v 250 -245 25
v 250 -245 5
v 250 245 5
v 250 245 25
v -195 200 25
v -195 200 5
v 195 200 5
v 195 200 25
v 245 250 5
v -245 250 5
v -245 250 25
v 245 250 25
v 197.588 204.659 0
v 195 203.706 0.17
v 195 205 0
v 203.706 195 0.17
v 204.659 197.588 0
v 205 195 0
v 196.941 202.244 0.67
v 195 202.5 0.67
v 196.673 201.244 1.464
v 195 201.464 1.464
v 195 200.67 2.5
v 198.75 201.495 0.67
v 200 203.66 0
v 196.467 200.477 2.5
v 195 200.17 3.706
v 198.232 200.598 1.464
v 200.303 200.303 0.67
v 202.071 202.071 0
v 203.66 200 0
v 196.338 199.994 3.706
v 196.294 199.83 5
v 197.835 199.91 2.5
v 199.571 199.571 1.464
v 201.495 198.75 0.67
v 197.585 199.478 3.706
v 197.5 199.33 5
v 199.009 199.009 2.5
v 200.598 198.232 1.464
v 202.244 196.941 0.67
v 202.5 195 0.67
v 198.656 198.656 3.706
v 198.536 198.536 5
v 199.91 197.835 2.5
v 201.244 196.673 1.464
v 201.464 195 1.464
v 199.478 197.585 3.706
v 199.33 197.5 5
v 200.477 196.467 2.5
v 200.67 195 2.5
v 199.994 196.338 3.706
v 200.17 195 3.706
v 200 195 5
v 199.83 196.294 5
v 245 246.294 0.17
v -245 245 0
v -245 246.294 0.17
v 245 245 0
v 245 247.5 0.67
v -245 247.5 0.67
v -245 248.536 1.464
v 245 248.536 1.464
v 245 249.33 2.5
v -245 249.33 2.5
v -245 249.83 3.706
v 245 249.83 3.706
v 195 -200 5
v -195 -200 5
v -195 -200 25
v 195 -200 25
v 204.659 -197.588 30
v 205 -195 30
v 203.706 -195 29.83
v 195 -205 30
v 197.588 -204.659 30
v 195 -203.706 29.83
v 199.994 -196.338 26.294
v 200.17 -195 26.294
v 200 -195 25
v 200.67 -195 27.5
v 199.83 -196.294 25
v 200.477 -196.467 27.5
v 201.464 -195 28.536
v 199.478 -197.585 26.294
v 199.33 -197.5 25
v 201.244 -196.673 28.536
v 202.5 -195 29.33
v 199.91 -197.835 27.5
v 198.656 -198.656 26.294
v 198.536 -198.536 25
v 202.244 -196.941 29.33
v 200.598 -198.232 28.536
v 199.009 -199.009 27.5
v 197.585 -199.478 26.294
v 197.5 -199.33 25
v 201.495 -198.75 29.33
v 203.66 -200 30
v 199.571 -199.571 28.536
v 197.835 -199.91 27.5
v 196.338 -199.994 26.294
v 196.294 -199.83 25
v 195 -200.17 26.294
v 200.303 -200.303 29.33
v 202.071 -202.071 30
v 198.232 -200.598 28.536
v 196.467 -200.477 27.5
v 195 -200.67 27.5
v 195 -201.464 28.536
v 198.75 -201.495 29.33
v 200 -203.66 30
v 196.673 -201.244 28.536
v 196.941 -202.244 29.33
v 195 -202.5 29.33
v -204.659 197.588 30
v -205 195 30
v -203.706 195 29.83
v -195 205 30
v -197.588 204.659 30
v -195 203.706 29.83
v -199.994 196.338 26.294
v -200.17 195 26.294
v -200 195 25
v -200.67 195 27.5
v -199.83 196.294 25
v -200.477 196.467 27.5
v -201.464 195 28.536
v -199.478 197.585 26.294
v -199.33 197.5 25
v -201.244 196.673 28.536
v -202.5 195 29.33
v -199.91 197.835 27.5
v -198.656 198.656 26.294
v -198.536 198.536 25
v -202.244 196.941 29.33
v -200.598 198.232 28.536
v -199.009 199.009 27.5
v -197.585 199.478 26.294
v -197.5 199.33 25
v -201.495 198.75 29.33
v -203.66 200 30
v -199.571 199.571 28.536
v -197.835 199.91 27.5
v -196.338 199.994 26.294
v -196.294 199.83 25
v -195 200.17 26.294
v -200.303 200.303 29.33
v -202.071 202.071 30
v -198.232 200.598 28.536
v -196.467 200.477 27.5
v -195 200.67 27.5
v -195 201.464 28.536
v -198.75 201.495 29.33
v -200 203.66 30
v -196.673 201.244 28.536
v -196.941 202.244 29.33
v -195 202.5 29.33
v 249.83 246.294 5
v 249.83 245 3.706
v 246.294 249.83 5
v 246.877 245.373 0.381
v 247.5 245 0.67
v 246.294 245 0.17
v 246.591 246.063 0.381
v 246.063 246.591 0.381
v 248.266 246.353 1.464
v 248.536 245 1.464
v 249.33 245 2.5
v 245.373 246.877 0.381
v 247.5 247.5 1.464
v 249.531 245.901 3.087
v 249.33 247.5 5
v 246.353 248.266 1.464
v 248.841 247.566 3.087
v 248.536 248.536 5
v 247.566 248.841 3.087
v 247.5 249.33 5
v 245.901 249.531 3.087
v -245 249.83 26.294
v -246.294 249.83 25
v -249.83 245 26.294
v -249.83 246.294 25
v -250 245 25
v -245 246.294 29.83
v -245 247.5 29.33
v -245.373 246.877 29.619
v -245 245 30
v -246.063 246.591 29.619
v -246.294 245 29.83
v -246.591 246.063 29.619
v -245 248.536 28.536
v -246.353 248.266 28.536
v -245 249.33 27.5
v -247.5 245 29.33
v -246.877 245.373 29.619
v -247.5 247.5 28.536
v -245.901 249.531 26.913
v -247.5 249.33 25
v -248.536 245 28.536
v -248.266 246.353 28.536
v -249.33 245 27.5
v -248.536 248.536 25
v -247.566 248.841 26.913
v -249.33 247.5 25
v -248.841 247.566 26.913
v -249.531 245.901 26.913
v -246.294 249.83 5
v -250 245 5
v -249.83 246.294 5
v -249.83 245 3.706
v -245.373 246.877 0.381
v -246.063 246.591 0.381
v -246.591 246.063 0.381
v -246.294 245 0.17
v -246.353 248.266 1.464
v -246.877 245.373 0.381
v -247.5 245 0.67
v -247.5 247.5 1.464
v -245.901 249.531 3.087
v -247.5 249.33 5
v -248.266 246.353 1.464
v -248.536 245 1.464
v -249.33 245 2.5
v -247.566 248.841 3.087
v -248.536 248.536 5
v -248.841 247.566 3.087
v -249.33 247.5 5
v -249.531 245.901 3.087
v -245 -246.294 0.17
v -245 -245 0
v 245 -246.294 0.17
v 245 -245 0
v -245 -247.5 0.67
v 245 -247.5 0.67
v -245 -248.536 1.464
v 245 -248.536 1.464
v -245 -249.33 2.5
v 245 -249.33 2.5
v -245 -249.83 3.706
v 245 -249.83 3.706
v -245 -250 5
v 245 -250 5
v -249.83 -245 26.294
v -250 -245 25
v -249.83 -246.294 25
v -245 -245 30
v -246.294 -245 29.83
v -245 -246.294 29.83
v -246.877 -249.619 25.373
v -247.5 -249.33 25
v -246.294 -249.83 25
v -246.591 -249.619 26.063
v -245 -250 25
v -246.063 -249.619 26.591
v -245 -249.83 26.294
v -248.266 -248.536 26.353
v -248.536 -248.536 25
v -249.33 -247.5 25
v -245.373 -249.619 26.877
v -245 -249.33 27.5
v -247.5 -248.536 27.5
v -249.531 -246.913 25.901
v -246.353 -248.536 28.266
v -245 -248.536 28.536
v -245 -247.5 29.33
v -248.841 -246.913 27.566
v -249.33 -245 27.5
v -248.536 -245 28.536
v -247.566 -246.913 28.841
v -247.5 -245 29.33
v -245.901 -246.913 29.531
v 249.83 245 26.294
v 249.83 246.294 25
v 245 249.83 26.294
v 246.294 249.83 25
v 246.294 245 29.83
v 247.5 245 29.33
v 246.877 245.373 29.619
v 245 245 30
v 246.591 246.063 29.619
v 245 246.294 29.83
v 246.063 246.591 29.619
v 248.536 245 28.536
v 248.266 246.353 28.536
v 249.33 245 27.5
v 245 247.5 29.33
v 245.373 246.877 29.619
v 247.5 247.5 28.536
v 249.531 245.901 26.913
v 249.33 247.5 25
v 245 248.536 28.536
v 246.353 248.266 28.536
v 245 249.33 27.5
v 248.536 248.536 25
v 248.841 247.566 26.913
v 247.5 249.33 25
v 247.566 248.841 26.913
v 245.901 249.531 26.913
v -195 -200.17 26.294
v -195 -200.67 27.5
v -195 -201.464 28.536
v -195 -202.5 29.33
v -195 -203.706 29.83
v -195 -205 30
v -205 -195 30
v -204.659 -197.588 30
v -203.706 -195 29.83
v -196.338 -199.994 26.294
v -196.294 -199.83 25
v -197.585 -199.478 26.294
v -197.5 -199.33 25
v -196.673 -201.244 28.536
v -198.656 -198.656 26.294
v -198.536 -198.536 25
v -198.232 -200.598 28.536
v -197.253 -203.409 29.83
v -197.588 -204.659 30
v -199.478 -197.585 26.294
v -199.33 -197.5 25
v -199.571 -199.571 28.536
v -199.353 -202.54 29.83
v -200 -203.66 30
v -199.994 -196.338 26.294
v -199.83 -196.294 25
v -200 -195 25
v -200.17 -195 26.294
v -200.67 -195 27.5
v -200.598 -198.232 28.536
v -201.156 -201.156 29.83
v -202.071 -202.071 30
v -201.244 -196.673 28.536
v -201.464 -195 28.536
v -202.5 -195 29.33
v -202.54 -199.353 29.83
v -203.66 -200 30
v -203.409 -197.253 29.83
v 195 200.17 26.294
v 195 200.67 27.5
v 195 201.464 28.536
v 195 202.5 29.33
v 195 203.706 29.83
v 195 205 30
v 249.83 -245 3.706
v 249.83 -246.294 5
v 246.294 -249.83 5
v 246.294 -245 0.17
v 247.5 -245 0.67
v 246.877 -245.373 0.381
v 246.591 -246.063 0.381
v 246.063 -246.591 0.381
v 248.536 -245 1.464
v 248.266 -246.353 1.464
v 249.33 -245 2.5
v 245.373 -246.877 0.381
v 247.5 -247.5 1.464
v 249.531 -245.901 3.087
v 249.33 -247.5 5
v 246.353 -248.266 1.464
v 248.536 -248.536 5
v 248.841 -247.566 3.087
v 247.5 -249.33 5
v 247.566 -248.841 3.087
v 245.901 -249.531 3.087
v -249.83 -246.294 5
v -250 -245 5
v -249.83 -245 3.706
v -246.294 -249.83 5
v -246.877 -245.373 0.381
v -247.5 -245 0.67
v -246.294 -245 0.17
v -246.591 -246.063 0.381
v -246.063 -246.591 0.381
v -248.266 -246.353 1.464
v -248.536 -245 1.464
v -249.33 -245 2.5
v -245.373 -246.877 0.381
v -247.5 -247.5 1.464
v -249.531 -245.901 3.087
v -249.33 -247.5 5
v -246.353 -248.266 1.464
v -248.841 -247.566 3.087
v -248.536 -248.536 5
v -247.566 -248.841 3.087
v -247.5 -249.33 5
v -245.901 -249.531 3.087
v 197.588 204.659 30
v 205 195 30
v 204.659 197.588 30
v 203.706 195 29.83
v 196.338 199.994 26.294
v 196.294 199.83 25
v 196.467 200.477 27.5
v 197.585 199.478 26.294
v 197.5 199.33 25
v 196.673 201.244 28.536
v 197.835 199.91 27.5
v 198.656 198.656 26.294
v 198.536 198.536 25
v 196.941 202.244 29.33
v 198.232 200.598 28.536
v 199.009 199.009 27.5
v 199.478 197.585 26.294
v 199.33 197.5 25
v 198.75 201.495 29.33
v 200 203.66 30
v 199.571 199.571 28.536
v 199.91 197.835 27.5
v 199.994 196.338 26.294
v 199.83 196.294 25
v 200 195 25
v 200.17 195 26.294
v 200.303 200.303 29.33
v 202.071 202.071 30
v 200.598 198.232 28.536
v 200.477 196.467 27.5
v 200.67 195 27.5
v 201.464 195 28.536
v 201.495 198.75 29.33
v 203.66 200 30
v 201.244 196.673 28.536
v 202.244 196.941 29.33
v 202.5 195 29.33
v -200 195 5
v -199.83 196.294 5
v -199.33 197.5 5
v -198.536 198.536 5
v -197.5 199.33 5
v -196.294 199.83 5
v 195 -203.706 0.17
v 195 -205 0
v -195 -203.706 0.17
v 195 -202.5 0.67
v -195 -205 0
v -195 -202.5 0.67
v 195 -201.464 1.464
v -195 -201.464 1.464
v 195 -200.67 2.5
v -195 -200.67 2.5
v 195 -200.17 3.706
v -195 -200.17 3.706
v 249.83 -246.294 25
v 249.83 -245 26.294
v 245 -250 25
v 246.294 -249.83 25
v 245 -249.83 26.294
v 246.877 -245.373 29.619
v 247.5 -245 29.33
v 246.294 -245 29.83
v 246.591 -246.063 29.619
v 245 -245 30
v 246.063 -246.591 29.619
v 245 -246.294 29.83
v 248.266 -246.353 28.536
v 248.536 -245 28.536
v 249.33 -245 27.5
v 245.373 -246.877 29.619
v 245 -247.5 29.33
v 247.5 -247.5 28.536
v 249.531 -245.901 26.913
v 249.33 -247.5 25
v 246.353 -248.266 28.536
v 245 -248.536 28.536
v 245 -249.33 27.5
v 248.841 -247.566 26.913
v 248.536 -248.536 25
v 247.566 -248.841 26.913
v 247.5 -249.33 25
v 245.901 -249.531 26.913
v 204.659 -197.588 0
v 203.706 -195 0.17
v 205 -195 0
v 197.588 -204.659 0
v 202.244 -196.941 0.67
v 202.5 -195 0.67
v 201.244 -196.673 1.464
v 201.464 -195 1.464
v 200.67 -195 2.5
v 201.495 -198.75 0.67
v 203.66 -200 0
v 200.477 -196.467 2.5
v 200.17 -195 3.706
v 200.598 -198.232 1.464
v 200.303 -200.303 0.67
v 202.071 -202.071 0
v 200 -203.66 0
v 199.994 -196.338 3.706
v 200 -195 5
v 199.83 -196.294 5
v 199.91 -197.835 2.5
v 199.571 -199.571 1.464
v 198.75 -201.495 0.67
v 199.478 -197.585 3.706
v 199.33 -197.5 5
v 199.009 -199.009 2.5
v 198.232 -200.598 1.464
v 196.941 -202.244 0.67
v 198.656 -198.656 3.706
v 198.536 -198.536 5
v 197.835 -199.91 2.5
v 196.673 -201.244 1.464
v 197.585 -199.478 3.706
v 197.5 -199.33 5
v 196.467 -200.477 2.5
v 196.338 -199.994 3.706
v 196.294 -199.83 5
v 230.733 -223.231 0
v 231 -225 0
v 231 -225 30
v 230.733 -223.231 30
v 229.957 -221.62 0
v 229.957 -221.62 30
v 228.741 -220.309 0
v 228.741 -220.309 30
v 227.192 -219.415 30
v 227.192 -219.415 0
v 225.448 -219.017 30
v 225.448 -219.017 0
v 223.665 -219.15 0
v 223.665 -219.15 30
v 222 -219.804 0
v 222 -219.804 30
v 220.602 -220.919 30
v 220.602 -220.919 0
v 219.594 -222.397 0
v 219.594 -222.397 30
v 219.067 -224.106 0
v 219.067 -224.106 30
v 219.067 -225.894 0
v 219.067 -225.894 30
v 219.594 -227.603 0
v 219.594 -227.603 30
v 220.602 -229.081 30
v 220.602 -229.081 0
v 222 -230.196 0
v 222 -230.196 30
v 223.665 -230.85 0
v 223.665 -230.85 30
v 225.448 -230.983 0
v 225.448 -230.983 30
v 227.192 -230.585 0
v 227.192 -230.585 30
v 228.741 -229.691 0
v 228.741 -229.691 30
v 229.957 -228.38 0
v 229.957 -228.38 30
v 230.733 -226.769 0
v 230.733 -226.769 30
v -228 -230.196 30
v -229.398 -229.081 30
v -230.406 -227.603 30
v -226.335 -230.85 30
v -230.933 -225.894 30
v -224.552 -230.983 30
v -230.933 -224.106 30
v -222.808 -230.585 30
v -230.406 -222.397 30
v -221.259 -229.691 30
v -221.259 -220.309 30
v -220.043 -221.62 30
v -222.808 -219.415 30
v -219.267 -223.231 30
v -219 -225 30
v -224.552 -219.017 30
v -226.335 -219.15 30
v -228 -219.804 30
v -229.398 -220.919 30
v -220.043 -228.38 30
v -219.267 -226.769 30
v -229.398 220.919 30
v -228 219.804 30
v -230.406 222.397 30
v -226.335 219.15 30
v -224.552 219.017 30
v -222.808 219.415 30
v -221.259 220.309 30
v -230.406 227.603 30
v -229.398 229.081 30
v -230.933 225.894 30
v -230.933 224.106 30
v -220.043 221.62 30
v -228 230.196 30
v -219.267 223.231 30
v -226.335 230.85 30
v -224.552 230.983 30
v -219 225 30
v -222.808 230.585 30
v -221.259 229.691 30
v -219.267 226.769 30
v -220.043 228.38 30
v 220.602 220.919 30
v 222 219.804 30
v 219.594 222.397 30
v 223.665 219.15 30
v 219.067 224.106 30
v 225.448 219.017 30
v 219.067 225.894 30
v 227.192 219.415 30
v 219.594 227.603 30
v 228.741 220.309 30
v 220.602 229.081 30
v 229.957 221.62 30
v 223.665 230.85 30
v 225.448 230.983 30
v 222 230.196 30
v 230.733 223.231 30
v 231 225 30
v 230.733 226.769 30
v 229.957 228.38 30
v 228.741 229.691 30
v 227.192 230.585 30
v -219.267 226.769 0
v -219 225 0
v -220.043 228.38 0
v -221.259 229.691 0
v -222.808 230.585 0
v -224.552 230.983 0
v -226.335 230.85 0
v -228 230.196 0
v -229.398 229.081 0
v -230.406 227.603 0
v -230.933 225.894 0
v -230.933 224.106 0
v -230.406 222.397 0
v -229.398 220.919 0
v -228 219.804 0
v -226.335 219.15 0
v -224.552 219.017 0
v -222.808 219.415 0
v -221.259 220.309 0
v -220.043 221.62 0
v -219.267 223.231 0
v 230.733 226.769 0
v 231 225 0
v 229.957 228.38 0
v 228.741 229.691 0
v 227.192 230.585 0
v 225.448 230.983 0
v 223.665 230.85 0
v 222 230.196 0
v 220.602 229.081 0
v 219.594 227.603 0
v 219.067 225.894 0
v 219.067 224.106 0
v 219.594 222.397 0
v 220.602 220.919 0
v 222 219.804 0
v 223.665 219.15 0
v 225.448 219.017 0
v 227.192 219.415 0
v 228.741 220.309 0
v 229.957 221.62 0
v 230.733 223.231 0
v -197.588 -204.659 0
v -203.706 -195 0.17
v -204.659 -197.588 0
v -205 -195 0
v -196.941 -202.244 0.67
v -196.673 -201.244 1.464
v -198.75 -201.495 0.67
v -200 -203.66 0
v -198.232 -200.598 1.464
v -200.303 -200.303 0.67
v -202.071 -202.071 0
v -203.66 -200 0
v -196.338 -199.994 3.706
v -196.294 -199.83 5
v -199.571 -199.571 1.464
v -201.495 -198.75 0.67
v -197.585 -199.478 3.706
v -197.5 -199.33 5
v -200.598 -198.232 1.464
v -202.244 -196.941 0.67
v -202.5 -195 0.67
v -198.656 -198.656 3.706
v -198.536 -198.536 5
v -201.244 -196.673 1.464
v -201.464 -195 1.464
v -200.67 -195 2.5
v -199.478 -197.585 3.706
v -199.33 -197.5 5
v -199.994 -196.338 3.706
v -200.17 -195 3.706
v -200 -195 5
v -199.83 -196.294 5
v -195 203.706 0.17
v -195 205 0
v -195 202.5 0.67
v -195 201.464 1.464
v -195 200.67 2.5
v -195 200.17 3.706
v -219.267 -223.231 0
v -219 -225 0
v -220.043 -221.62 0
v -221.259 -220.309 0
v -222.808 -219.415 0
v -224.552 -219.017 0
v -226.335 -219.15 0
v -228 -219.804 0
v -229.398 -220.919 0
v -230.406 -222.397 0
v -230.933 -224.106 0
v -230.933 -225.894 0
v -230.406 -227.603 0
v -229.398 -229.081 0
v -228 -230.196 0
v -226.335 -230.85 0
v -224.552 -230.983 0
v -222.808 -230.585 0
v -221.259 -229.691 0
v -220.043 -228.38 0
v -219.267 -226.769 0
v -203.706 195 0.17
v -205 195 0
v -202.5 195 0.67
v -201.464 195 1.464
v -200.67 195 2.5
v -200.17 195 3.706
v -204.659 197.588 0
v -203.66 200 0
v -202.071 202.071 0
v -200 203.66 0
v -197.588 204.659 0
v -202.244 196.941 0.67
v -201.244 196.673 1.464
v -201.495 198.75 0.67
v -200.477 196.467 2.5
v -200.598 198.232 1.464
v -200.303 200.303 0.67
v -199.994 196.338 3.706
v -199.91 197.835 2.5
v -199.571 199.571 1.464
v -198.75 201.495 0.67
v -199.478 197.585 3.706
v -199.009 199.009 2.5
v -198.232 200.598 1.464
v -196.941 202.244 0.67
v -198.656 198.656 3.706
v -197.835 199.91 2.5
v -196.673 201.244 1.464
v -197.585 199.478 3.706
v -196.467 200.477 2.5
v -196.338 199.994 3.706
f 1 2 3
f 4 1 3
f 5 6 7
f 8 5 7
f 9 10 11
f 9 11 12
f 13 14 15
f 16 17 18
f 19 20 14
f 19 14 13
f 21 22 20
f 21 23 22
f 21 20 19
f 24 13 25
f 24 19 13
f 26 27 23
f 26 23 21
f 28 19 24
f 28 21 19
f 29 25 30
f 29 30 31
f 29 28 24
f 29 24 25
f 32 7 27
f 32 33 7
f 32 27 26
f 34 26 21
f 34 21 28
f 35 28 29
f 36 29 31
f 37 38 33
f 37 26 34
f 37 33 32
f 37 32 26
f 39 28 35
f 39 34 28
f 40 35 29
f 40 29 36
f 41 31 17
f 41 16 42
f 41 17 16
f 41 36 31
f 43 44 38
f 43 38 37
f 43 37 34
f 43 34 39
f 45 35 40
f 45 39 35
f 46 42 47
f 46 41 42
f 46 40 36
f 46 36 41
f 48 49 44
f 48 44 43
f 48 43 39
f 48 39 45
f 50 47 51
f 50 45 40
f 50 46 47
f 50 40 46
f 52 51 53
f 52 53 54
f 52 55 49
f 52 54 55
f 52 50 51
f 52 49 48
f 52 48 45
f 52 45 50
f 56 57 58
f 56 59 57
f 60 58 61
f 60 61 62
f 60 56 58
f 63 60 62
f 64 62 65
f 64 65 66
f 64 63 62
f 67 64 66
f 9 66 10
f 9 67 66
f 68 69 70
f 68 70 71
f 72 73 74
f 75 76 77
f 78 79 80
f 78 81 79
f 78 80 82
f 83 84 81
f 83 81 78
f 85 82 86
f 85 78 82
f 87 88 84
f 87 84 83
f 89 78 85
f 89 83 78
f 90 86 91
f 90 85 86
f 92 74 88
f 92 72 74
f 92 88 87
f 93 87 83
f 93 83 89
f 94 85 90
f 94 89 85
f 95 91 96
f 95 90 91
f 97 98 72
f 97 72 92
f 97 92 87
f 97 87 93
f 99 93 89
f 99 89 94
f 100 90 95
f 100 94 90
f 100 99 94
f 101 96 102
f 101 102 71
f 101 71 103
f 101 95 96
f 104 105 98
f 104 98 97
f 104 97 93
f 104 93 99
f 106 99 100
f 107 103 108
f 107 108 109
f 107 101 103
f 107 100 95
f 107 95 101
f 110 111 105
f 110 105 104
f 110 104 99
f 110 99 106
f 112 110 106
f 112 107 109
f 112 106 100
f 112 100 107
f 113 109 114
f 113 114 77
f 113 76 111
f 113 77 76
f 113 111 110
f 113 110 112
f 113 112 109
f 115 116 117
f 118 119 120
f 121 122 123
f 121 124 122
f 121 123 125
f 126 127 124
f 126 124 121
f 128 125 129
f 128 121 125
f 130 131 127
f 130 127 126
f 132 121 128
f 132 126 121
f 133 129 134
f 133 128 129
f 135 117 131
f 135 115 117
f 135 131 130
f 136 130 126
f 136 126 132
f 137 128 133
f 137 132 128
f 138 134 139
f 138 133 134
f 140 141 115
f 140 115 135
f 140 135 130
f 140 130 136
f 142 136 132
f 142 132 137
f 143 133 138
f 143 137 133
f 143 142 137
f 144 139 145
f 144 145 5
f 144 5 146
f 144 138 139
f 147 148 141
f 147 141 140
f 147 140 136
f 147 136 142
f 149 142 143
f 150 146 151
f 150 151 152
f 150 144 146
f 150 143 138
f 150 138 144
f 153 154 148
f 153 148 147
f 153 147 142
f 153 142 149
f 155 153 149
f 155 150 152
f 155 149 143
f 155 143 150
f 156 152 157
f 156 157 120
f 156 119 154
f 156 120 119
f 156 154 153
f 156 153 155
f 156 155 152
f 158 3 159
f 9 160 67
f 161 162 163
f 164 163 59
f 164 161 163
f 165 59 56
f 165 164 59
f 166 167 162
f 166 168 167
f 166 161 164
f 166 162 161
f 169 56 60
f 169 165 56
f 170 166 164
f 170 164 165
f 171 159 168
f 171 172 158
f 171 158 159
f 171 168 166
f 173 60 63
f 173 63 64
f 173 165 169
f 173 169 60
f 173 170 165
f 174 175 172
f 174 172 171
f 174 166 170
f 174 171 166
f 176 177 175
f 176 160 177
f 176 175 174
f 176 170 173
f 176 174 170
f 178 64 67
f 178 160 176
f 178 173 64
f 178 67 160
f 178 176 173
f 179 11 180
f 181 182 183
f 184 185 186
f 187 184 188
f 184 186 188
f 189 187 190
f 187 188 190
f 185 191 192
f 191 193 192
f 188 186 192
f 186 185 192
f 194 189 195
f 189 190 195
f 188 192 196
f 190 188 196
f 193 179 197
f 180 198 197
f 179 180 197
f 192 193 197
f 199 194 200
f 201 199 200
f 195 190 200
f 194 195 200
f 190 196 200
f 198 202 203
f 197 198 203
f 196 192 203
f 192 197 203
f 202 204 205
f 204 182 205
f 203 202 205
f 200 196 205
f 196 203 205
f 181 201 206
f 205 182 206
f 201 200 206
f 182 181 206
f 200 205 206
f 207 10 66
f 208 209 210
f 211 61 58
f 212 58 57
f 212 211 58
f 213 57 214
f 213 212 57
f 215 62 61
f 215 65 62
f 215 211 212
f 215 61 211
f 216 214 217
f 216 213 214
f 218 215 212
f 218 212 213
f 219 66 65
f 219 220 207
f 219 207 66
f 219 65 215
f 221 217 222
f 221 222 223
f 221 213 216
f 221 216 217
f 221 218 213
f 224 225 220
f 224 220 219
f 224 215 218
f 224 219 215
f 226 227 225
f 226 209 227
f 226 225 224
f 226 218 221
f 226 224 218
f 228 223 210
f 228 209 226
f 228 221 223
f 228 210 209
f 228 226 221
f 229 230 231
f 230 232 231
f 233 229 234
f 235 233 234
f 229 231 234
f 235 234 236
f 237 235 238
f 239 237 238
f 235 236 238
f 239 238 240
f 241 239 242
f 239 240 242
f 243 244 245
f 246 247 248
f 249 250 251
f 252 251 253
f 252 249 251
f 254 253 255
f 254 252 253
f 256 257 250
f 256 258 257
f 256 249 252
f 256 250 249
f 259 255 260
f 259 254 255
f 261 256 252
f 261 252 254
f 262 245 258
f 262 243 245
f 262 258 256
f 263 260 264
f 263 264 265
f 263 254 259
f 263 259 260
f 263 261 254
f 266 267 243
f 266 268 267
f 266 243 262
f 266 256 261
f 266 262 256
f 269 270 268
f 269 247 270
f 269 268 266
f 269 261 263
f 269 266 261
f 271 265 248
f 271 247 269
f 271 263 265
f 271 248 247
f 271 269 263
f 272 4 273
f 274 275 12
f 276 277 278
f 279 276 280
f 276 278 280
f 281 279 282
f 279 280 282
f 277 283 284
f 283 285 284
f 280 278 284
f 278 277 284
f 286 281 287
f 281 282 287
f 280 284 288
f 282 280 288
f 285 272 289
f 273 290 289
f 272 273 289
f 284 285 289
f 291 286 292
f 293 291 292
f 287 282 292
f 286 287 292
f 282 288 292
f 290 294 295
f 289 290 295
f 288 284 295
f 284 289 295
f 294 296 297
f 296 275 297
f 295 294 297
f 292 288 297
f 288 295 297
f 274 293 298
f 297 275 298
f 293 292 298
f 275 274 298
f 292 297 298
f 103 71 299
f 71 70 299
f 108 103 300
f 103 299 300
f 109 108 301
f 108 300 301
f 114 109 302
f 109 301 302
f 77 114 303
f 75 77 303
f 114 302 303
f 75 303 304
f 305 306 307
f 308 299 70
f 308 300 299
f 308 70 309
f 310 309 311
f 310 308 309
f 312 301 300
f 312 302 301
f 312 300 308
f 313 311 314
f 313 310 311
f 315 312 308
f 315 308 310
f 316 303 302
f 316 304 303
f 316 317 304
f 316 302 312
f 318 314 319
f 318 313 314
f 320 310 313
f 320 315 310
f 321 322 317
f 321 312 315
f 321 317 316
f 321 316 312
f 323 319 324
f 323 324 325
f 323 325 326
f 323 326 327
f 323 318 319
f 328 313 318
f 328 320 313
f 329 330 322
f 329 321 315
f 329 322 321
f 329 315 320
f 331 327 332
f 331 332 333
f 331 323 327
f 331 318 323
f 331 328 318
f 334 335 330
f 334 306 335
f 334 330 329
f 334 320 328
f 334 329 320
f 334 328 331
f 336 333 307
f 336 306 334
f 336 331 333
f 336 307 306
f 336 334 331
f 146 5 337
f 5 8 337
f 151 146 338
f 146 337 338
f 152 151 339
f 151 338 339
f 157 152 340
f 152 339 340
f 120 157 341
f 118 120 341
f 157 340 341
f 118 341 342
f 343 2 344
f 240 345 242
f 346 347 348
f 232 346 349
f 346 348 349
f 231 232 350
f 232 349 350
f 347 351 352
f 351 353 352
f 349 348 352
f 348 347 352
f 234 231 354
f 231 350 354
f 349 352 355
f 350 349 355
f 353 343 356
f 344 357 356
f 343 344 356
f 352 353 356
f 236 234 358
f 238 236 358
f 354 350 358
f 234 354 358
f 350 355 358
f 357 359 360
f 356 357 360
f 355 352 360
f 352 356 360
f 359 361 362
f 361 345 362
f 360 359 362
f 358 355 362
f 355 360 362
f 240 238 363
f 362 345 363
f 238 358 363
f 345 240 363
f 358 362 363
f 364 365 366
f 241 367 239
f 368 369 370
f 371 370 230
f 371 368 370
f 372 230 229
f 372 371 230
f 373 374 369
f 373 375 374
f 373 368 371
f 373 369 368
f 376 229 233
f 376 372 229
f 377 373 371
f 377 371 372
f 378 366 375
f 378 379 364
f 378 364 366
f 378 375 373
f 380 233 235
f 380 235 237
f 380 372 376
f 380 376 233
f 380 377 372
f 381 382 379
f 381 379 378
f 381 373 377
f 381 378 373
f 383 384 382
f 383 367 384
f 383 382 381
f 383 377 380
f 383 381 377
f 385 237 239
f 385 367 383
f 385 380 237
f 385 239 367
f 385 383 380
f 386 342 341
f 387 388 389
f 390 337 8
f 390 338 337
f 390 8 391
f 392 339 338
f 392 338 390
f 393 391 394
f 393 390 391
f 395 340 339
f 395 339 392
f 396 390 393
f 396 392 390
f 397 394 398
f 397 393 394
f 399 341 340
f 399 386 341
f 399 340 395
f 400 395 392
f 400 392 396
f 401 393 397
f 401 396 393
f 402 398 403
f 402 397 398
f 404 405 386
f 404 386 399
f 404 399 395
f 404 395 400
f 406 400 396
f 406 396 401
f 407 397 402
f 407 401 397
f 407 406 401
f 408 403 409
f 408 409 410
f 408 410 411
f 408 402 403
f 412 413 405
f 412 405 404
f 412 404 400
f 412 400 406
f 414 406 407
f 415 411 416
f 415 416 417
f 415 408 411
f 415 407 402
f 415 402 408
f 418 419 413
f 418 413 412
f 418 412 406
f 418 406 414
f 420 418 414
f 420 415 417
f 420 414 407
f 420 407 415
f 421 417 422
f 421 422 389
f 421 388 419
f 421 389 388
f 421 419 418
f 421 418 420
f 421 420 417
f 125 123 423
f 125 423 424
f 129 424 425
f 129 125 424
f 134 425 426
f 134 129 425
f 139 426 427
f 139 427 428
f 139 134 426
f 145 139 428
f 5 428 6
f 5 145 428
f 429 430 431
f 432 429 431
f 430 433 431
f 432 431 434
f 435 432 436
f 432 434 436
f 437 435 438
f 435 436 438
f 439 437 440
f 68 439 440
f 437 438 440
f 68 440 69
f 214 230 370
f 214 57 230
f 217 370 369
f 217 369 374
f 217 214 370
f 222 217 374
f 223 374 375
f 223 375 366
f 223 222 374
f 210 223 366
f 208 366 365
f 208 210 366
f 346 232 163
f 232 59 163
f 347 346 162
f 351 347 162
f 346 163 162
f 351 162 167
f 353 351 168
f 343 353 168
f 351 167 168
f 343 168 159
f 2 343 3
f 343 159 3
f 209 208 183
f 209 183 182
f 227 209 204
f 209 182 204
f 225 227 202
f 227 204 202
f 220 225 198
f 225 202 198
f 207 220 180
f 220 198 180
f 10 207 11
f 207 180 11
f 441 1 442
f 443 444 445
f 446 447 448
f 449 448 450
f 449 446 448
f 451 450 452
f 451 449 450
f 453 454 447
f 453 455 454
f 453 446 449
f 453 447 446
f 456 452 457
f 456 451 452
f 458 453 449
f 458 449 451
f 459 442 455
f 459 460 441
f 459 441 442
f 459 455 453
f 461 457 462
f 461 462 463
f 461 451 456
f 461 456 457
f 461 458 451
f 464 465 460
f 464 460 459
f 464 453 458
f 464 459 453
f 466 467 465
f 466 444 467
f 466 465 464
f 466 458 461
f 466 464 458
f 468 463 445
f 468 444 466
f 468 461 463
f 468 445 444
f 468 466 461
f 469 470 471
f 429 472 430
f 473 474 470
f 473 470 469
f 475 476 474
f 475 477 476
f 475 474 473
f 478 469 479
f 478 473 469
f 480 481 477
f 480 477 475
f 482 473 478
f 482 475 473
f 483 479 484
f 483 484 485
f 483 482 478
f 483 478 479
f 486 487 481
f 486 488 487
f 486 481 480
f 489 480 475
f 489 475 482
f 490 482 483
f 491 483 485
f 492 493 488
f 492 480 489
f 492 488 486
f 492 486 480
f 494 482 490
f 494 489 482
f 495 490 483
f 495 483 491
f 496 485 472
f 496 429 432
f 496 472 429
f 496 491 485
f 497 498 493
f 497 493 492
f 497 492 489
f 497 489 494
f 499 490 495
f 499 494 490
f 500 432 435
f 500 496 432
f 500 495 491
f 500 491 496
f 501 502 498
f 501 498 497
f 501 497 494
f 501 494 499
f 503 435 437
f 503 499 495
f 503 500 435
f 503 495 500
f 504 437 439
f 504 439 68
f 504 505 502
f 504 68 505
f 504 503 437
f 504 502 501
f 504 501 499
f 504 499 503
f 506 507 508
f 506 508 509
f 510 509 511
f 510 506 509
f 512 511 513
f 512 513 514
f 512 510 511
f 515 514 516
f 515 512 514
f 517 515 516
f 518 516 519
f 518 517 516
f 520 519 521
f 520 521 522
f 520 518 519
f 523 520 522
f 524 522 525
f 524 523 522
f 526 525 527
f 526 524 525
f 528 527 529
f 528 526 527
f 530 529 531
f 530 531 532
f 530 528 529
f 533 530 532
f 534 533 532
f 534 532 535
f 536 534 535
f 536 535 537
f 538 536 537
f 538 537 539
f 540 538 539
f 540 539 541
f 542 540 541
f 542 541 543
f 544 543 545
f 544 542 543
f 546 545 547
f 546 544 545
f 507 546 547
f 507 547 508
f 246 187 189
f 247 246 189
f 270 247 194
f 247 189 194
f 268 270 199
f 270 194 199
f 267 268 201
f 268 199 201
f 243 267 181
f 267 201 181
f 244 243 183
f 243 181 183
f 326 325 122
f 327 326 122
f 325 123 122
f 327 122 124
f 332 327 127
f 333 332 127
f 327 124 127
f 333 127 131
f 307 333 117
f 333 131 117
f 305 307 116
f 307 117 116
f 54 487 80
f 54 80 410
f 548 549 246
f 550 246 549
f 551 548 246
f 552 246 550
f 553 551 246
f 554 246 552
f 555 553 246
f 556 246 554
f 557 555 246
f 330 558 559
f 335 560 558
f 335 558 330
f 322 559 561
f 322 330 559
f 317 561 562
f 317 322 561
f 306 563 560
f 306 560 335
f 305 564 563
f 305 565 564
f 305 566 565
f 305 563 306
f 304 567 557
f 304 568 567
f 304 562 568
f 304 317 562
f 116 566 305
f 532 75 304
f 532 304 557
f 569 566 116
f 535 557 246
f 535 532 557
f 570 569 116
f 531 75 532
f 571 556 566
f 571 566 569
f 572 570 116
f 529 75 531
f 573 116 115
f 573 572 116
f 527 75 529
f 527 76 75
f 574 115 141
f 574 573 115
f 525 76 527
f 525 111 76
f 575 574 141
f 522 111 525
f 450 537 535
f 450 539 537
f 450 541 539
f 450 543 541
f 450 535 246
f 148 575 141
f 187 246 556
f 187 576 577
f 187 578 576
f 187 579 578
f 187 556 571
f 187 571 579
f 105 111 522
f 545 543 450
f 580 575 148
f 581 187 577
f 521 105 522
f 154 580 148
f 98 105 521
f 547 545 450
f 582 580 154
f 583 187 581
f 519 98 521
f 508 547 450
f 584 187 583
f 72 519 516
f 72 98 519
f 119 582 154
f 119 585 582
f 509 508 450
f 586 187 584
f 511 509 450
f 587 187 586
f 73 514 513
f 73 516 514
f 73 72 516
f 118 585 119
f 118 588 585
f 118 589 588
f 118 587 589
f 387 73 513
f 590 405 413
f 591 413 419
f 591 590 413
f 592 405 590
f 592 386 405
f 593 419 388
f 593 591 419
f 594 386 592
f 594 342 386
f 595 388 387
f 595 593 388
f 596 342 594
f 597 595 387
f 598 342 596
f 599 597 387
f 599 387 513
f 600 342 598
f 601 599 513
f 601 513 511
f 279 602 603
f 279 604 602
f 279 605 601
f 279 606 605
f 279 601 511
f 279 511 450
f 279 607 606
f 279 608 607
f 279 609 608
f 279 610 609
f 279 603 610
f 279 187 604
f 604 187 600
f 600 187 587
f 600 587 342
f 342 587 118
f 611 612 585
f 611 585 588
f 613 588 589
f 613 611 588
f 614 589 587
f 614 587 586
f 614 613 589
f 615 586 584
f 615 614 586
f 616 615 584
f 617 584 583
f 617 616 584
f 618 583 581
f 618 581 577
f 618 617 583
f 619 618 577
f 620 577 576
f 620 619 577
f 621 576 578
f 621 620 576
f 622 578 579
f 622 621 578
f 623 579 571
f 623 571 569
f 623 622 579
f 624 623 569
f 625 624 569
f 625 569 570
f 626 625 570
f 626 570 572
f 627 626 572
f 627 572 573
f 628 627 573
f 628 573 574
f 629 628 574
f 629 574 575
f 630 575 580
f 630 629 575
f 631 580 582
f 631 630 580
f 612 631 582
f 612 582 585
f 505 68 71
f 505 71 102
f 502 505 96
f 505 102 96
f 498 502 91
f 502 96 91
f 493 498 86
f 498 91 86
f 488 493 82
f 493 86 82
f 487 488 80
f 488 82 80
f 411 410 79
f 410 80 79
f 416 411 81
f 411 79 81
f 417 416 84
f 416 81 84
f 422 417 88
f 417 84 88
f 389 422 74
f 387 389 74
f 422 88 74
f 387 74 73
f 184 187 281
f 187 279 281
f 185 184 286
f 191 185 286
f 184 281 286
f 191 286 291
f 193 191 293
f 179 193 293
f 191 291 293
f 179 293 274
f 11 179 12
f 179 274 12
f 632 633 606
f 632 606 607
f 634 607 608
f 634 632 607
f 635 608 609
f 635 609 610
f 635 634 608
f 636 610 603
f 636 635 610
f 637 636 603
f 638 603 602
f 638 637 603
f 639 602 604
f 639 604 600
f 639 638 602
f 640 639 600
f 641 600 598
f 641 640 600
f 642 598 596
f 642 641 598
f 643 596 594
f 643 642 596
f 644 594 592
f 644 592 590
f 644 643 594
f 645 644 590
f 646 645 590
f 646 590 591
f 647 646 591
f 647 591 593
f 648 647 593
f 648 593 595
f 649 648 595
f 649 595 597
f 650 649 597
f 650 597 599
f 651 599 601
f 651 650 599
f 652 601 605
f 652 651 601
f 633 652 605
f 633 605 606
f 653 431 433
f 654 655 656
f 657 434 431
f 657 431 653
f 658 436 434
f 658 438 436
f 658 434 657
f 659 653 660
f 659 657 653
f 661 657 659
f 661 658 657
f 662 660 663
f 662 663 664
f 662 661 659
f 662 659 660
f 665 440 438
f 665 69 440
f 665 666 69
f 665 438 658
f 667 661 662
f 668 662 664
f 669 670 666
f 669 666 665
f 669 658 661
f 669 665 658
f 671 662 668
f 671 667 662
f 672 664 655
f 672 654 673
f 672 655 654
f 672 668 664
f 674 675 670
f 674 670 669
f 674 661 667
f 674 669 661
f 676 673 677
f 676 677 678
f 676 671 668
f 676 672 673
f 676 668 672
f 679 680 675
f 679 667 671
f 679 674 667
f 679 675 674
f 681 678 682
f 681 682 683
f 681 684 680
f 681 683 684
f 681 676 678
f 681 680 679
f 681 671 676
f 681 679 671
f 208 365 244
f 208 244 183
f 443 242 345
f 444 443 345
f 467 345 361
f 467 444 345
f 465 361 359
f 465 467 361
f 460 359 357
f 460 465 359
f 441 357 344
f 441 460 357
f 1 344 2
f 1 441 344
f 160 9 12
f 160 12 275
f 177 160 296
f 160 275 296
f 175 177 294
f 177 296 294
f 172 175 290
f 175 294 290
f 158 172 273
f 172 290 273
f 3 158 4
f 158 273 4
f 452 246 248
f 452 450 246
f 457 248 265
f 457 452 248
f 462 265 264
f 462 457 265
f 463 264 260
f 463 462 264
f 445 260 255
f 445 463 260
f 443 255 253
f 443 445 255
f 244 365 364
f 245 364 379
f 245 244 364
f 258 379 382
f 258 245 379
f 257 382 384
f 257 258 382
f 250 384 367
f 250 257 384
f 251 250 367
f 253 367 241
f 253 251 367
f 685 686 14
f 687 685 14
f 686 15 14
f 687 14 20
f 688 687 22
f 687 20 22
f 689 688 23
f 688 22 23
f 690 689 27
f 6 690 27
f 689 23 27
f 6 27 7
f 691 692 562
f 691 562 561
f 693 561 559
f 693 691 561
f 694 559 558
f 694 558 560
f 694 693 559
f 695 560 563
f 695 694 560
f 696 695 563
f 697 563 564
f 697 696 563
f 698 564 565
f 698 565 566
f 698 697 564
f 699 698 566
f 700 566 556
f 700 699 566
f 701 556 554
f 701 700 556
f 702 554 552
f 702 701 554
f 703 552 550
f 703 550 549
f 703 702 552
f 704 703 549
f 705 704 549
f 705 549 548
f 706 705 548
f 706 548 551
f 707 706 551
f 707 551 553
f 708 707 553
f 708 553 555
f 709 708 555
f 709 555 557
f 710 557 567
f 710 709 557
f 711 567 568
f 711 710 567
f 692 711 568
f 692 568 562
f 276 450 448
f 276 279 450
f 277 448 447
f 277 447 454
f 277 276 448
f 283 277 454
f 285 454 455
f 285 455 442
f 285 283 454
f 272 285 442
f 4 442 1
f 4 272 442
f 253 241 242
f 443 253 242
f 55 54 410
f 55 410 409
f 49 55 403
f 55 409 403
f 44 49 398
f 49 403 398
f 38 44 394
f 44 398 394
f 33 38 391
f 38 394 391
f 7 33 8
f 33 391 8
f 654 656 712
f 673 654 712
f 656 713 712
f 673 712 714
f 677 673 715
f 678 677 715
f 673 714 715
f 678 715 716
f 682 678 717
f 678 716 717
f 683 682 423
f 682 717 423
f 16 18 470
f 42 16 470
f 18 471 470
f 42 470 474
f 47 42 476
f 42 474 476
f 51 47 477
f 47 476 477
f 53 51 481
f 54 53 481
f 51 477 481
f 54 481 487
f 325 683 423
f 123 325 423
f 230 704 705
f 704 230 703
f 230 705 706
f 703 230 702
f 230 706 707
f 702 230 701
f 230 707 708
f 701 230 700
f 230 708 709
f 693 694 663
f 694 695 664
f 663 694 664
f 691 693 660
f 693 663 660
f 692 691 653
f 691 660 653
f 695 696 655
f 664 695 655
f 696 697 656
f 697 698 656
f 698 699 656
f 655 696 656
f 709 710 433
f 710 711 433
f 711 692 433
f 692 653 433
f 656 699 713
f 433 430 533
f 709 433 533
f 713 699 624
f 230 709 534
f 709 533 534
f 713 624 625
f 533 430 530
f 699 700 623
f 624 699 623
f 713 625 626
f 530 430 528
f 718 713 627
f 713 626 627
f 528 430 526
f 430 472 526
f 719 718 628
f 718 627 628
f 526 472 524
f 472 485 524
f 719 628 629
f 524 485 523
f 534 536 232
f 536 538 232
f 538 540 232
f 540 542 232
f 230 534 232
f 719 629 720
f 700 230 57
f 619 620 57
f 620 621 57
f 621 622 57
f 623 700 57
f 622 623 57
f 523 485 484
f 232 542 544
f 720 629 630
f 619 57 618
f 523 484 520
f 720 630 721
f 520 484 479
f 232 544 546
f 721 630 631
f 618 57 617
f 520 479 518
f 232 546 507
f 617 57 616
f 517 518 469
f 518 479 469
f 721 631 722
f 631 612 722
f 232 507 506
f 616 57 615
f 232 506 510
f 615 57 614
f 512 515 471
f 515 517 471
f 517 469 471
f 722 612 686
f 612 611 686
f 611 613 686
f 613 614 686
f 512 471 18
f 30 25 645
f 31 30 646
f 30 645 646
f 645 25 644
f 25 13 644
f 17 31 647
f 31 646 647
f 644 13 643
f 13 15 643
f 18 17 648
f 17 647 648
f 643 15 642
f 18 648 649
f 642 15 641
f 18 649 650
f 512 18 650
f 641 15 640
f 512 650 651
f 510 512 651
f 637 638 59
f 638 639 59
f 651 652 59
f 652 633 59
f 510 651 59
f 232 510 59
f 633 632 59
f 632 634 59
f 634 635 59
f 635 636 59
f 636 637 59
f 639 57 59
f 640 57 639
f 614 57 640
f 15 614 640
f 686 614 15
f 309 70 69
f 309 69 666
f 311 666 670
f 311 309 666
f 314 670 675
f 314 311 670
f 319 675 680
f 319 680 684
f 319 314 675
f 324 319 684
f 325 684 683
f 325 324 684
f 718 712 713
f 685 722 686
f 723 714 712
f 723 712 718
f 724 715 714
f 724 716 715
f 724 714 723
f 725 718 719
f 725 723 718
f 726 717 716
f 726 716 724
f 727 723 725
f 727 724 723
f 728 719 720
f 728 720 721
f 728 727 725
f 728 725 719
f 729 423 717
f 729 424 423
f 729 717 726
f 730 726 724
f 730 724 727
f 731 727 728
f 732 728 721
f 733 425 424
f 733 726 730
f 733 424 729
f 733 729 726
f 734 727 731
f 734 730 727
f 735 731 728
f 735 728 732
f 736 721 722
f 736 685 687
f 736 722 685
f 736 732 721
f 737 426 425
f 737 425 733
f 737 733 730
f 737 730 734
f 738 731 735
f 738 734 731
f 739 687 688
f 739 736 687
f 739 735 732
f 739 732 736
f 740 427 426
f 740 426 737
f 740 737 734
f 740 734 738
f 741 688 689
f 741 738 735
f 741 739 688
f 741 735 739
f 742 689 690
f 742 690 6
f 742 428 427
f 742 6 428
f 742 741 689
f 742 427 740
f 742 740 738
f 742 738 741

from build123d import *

# Parameters (mm, degrees)
F0_W     = 500
F0_H     = 500
F0_R     = 6
F0_W_2   = 400
F0_H_2   = 400
F1_DEPTH = 30
F6_F1_R  = 5
F6_F2_R  = 5
F6_F3_R  = 5


with BuildPart() as f1:
    # F0 (on Top) → F1 (new body)
    with BuildSketch(Plane.XY):
        Rectangle(F0_W, F0_H)
        with Locations((-225, -225)):
            Circle(F0_R, mode=Mode.SUBTRACT)
        with Locations((225, -225)):
            Circle(F0_R, mode=Mode.SUBTRACT)
        with Locations((-225, 225)):
            Circle(F0_R, mode=Mode.SUBTRACT)
        Rectangle(F0_W_2, F0_H_2, mode=Mode.SUBTRACT)
        with Locations((225, 225)):
            Circle(F0_R, mode=Mode.SUBTRACT)
    extrude(amount=F1_DEPTH)

    # F6: fillet of radius 5 on 22 edges, made by hand

    # F6_f1
    f6_f1_edges = [f1.edges().sort_by_distance(p)[0] for p in [
        (-200, -200, 15),
        (-200, 200, 15),
        (200, 200, 15),
        (200, -200, 15),
    ]]
    fillet(f6_f1_edges, radius=F6_F1_R)

    # F6_f2
    f6_f2_edges = [f1.edges().sort_by_distance(p)[0] for p in [
        (250, -250, 15),
        (250, 250, 15),
        (250, 0, 0),
        (250, 0, 30),
        (-250, 250, 15),
        (0, 250, 0),
        (0, 250, 30),
        (-250, 0, 30),
        (-250, -250, 15),
        (-250, 0, 0),
        (0, -250, 0),
        (0, -250, 30),
    ]]
    fillet(f6_f2_edges, radius=F6_F2_R)

    # F6_f3
    f6_f3_edges = [f1.edges().sort_by_distance(p)[0] for p in [
        (-200, 0, 0),
        (-200, 0, 30),
        (0, 200, 0),
        (0, 200, 30),
        (0, -200, 0),
        (0, -200, 30),
        (198.5355339059, -198.5355339059, 30),
        (-198.5355339059, -198.5355339059, 30),
        (198.5355339059, -198.5355339059, 0),
        (-198.5355339059, -198.5355339059, 0),
        (-198.5355339059, 198.5355339059, 30),
        (198.5355339059, 198.5355339059, 30),
        (-198.5355339059, 198.5355339059, 0),
        (198.5355339059, 198.5355339059, 0),
    ]]
    fillet(f6_f3_edges, radius=F6_F3_R)


solid = f1.part
